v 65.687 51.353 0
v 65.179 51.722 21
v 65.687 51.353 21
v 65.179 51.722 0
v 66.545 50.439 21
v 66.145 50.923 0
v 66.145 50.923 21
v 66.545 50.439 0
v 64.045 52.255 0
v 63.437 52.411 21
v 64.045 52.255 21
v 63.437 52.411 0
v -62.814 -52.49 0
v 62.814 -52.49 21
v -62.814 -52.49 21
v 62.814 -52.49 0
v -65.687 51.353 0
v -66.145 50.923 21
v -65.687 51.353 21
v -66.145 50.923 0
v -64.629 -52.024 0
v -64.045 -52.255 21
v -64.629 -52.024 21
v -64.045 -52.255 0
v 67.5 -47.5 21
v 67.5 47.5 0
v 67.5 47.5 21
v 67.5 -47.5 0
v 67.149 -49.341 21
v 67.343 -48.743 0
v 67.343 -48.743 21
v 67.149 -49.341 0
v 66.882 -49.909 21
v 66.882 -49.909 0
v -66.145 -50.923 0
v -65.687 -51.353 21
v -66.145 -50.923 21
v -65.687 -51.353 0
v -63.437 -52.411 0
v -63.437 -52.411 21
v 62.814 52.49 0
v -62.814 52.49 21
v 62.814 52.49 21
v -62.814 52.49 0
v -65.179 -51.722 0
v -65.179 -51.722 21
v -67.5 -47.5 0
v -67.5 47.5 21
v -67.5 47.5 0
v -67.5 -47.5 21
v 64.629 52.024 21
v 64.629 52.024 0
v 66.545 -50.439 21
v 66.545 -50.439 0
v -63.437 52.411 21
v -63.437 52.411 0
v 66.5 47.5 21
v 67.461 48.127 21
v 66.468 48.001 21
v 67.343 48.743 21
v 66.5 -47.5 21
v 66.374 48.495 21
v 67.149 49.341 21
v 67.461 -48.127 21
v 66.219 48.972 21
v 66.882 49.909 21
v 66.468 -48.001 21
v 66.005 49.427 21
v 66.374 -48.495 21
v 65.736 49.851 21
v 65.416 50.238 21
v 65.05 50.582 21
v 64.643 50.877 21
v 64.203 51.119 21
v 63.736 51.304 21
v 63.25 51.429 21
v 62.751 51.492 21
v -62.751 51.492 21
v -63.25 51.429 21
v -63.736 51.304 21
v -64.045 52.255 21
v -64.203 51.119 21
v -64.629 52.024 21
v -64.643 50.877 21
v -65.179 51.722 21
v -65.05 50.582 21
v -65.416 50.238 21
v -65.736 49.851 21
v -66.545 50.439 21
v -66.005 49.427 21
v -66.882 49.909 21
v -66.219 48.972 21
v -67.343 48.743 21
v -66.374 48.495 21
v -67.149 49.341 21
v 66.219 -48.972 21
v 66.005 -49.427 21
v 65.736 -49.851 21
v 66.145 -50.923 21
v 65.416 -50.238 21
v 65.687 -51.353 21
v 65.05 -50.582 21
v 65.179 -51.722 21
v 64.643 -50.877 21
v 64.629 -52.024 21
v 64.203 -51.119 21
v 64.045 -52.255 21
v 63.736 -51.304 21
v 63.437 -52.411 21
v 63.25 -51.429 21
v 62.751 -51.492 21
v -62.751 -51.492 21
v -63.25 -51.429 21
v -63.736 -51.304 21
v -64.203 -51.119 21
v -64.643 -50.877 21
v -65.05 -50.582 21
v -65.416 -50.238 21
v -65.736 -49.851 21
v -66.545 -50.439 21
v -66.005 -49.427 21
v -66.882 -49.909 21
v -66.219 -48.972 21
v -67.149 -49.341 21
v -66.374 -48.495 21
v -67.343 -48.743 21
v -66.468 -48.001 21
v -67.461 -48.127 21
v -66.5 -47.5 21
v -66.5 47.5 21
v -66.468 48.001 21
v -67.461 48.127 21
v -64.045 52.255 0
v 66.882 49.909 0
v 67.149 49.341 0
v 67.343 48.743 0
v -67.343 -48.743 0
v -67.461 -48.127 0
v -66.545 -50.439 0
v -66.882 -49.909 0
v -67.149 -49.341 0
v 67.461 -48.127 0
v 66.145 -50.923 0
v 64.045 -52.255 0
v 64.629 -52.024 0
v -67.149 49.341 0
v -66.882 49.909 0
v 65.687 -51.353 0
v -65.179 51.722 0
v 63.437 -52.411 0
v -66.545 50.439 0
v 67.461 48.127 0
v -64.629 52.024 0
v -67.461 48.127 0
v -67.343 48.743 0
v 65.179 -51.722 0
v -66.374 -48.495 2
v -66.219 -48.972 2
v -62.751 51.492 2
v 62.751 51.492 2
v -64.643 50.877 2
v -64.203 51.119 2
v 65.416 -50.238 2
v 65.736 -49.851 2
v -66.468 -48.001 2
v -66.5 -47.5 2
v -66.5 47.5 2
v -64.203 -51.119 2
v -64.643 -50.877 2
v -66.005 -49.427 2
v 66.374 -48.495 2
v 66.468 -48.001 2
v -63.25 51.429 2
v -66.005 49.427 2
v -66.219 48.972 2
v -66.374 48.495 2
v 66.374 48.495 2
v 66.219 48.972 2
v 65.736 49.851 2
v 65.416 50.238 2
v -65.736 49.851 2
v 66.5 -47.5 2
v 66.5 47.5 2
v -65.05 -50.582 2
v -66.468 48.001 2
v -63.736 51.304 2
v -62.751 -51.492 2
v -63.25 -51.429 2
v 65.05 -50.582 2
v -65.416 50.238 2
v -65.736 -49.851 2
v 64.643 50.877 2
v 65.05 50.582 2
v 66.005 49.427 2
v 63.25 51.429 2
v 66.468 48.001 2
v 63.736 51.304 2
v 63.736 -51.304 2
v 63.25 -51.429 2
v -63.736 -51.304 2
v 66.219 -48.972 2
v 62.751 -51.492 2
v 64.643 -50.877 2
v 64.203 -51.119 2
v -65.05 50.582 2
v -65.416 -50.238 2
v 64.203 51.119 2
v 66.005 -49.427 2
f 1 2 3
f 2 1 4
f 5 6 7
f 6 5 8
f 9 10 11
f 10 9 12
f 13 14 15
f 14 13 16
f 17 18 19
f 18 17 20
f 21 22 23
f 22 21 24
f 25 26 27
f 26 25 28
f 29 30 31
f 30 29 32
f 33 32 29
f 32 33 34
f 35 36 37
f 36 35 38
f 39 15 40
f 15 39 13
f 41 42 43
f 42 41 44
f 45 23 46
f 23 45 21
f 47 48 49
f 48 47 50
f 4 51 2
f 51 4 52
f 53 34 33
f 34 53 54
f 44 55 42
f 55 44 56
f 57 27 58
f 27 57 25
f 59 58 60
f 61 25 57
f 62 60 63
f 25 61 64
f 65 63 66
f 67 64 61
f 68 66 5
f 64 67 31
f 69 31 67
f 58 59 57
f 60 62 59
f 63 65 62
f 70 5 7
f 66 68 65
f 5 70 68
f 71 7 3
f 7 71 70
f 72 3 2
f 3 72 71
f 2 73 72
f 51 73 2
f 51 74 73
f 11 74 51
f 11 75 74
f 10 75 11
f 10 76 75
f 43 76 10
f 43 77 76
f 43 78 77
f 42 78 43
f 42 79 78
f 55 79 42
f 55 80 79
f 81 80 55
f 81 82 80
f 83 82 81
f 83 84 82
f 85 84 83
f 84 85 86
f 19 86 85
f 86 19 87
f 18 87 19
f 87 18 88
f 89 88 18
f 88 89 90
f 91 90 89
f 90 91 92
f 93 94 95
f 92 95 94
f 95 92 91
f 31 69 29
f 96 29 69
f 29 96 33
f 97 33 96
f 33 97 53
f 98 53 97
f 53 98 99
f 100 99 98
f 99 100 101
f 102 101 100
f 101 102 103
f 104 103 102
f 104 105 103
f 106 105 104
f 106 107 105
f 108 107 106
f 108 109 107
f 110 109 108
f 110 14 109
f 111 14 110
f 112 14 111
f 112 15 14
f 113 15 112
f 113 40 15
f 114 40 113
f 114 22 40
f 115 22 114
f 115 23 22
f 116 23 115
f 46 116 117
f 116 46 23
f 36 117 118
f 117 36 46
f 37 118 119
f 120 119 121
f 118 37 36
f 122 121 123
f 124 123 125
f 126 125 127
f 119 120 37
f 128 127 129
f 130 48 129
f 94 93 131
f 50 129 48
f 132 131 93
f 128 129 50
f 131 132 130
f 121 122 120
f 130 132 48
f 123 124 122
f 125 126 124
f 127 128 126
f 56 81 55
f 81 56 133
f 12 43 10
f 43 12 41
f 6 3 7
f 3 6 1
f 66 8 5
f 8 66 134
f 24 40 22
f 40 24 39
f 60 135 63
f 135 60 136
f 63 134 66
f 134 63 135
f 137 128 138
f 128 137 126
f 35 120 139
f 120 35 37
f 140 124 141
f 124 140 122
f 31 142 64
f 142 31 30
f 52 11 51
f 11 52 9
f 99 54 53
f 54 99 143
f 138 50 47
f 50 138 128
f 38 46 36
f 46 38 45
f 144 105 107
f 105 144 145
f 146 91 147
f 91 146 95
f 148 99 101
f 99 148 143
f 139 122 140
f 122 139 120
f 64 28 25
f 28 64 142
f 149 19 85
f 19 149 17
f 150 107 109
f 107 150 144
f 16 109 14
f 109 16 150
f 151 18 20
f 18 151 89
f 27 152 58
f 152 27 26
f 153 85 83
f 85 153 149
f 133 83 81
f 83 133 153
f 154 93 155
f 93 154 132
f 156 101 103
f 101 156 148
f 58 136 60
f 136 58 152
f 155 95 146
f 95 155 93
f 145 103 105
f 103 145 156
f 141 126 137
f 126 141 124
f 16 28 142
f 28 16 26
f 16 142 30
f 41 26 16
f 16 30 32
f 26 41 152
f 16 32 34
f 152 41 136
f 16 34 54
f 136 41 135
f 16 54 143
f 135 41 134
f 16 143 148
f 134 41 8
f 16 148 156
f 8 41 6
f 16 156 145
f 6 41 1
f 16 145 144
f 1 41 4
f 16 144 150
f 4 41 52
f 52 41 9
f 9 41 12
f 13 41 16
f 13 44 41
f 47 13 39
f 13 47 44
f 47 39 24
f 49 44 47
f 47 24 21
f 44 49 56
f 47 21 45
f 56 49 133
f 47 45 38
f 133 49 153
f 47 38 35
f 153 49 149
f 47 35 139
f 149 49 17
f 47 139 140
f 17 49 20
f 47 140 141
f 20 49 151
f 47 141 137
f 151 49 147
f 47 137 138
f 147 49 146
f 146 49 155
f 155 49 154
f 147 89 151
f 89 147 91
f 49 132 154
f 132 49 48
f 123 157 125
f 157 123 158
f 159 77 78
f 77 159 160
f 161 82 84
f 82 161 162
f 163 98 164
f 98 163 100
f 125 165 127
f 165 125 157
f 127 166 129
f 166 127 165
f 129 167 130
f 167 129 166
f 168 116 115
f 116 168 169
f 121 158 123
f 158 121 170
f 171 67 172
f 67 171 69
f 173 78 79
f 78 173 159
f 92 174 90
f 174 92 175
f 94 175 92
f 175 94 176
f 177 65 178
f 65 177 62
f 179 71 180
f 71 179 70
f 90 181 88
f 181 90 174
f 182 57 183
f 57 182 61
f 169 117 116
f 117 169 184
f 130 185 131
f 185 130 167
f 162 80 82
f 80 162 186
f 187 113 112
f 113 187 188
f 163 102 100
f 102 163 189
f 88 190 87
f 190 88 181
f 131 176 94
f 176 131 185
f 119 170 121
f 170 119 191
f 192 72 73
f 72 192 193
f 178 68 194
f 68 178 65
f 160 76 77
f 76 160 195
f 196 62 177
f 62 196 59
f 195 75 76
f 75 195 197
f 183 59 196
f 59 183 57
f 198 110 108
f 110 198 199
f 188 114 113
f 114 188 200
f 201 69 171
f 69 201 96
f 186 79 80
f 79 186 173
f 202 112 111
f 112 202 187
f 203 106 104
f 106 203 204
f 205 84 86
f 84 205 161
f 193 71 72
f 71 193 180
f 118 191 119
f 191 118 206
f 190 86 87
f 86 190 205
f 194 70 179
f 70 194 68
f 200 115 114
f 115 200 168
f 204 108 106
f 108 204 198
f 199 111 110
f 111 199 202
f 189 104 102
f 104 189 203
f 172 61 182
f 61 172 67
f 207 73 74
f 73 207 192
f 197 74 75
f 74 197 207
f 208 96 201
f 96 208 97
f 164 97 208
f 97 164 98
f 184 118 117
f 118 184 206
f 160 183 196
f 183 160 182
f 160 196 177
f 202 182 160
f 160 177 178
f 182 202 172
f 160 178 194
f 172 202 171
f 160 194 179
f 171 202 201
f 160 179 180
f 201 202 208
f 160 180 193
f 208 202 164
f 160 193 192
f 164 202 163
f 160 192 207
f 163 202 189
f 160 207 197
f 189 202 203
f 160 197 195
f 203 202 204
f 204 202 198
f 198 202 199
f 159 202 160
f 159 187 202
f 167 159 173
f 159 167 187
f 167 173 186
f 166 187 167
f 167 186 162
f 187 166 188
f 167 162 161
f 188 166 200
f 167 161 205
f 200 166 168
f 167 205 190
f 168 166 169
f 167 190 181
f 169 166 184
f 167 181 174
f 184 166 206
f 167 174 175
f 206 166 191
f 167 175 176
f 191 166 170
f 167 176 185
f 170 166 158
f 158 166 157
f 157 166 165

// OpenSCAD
$fn = 50;


difference() {
	union() {
		hull() {
			translate(v = [-62.5000000000, 47.5000000000, 0]) {
				cylinder(h = 21, r = 5);
			}
			translate(v = [62.5000000000, 47.5000000000, 0]) {
				cylinder(h = 21, r = 5);
			}
			translate(v = [-62.5000000000, -47.5000000000, 0]) {
				cylinder(h = 21, r = 5);
			}
			translate(v = [62.5000000000, -47.5000000000, 0]) {
				cylinder(h = 21, r = 5);
			}
		}
	}
	union() {
		translate(v = [0, 0, 2]) {
			hull() {
				translate(v = [-62.5000000000, 47.5000000000, 0]) {
					cylinder(h = 19, r = 4);
				}
				translate(v = [62.5000000000, 47.5000000000, 0]) {
					cylinder(h = 19, r = 4);
				}
				translate(v = [-62.5000000000, -47.5000000000, 0]) {
					cylinder(h = 19, r = 4);
				}
				translate(v = [62.5000000000, -47.5000000000, 0]) {
					cylinder(h = 19, r = 4);
				}
			}
		}
	}
}
